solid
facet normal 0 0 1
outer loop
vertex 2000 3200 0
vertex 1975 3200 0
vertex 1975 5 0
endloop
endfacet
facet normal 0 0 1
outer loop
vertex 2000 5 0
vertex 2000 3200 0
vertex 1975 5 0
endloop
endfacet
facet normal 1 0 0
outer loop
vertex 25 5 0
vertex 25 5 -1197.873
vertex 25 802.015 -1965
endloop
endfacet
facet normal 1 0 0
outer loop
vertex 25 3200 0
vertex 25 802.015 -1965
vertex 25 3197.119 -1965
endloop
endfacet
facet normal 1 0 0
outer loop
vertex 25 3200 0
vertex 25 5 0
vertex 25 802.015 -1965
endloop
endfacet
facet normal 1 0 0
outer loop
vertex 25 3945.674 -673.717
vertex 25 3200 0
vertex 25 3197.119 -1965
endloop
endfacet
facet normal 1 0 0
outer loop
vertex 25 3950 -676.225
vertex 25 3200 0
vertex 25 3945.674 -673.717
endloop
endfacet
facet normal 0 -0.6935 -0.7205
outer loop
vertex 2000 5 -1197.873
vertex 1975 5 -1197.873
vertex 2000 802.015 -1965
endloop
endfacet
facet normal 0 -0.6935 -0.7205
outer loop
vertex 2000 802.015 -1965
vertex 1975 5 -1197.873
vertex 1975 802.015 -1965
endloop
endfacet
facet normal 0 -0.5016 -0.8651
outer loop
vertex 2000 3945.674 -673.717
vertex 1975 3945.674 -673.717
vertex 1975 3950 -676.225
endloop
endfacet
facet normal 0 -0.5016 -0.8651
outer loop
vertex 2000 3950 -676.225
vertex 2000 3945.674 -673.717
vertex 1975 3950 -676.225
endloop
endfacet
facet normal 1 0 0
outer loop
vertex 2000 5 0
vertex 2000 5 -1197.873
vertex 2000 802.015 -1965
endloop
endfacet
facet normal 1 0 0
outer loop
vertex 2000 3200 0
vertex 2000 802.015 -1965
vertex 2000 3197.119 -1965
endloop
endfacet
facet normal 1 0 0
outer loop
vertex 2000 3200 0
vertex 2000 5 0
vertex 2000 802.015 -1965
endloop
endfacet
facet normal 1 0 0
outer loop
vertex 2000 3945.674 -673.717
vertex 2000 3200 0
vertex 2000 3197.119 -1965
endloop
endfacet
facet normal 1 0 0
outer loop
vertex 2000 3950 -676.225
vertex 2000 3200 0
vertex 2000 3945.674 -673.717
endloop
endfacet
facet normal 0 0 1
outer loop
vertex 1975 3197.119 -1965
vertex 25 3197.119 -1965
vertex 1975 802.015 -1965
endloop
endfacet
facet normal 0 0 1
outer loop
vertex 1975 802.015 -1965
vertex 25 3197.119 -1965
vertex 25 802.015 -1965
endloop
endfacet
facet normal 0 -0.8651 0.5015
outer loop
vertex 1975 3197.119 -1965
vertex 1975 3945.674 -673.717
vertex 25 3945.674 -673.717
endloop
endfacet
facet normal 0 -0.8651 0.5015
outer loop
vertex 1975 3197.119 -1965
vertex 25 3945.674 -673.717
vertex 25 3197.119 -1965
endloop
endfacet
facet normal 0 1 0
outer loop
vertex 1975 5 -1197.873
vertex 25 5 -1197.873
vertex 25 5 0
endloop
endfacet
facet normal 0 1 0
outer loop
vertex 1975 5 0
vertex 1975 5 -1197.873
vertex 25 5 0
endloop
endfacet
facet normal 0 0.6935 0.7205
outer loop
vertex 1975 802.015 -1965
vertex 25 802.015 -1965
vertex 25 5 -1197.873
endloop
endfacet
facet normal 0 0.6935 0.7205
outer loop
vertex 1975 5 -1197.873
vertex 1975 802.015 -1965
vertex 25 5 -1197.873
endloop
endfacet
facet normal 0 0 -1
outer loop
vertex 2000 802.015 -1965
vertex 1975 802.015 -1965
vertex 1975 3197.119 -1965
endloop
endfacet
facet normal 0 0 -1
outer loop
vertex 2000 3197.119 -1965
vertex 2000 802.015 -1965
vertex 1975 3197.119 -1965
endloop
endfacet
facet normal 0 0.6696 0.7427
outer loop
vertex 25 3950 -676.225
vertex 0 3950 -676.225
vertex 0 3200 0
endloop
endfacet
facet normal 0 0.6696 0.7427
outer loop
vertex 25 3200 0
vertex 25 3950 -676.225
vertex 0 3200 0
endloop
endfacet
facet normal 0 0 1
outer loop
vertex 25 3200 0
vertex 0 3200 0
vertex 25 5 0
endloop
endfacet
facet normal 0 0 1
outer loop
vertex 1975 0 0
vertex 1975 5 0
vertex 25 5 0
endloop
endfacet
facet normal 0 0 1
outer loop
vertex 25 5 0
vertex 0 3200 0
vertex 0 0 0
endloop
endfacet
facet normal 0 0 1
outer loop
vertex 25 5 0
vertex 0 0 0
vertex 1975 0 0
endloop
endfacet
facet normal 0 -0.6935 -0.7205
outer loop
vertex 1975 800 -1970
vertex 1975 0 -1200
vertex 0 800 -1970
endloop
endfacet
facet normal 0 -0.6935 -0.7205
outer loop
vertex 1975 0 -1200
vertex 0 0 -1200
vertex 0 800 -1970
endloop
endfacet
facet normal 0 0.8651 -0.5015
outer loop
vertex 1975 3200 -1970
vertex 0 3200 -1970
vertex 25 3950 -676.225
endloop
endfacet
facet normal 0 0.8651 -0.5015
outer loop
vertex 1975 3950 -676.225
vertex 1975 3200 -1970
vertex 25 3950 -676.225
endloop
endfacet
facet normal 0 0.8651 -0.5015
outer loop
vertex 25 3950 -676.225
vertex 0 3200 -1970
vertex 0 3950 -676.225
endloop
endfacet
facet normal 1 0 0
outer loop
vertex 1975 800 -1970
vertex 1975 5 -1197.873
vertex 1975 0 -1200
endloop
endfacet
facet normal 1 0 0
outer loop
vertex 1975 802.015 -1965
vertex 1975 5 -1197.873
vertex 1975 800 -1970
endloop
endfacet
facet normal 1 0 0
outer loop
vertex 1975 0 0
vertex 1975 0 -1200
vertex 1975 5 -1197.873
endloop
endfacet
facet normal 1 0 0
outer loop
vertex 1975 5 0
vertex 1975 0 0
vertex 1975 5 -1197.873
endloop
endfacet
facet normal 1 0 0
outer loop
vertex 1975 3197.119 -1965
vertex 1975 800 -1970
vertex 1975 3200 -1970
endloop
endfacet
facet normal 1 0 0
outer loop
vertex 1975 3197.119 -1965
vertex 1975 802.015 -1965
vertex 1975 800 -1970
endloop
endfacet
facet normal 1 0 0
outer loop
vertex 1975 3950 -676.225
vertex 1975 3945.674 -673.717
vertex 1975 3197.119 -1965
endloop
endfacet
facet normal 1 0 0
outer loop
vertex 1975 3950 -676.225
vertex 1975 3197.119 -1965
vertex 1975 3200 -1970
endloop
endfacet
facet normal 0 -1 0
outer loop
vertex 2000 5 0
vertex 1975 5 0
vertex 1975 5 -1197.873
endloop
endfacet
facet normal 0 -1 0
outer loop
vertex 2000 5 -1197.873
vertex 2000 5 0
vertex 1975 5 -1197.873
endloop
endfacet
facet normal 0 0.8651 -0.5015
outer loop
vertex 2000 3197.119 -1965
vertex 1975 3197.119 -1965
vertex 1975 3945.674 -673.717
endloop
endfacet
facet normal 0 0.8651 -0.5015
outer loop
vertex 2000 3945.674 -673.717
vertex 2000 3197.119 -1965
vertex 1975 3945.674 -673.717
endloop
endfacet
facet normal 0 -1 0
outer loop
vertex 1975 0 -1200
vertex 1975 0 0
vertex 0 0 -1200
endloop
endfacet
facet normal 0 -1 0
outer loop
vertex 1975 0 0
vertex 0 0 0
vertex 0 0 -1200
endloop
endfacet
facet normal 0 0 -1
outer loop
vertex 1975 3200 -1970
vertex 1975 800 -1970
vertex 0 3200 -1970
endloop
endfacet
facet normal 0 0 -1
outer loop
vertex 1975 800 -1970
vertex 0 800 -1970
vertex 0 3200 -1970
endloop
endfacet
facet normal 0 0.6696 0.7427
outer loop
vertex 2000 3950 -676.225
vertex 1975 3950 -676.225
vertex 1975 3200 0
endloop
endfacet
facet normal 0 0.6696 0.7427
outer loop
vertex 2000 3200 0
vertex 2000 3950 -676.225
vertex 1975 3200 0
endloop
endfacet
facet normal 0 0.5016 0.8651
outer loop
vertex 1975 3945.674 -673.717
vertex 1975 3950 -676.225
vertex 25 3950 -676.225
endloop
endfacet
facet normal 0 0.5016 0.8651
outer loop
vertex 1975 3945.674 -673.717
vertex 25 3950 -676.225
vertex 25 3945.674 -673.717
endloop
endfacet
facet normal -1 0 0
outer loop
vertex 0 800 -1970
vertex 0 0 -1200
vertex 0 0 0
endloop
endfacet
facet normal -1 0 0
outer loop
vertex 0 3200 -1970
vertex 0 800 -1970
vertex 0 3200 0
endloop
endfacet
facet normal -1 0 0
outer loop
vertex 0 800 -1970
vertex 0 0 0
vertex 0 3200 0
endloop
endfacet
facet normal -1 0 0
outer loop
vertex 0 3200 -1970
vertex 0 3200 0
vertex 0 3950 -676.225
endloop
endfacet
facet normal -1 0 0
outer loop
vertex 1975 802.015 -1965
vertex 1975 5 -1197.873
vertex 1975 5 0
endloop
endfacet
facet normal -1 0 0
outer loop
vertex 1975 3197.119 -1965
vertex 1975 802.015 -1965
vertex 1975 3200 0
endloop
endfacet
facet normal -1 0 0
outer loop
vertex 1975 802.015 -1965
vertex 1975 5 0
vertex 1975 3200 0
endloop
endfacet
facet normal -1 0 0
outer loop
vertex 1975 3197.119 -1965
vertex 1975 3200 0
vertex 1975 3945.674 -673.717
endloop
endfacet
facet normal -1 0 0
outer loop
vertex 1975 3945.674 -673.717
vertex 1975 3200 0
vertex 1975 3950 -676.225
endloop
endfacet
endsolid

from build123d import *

# Parameters (mm, degrees)
F1_DEPTH = 25
F3_DEPTH = 1950
F5_DEPTH = 25


with BuildPart() as f1:
    # F0 (on Right) → F1 (new body)
    with BuildSketch(Plane.YZ):
        Polygon((3200, 0), (0, 0), (0, -1200), (800, -1970), (3200, -1970), (3950, -676.224649), align=None)
    extrude(amount=F1_DEPTH)

    # F2 (on face) → F3 (join)
    with BuildSketch(Plane.YZ.offset(25)):
        Polygon((3945.674279, -673.717034), (3197.119111, -1965), (802.015327, -1965), (5, -1197.872748), (5, 0), (0, 0), (0, -1200), (800, -1970), (3200, -1970), (3950, -676.224649), align=None)
    extrude(amount=F3_DEPTH)


with BuildPart() as f5:
    # F4 (on face) → F5 (new body)
    with BuildSketch(Plane.YZ.offset(1975)):
        Polygon((3950, -676.224649), (3200, 0), (5, 0), (5, -1197.872748), (802.015327, -1965), (3197.119111, -1965), (3945.674279, -673.717034), align=None)
    extrude(amount=F5_DEPTH)


solid = Compound([f1.part, f5.part])
